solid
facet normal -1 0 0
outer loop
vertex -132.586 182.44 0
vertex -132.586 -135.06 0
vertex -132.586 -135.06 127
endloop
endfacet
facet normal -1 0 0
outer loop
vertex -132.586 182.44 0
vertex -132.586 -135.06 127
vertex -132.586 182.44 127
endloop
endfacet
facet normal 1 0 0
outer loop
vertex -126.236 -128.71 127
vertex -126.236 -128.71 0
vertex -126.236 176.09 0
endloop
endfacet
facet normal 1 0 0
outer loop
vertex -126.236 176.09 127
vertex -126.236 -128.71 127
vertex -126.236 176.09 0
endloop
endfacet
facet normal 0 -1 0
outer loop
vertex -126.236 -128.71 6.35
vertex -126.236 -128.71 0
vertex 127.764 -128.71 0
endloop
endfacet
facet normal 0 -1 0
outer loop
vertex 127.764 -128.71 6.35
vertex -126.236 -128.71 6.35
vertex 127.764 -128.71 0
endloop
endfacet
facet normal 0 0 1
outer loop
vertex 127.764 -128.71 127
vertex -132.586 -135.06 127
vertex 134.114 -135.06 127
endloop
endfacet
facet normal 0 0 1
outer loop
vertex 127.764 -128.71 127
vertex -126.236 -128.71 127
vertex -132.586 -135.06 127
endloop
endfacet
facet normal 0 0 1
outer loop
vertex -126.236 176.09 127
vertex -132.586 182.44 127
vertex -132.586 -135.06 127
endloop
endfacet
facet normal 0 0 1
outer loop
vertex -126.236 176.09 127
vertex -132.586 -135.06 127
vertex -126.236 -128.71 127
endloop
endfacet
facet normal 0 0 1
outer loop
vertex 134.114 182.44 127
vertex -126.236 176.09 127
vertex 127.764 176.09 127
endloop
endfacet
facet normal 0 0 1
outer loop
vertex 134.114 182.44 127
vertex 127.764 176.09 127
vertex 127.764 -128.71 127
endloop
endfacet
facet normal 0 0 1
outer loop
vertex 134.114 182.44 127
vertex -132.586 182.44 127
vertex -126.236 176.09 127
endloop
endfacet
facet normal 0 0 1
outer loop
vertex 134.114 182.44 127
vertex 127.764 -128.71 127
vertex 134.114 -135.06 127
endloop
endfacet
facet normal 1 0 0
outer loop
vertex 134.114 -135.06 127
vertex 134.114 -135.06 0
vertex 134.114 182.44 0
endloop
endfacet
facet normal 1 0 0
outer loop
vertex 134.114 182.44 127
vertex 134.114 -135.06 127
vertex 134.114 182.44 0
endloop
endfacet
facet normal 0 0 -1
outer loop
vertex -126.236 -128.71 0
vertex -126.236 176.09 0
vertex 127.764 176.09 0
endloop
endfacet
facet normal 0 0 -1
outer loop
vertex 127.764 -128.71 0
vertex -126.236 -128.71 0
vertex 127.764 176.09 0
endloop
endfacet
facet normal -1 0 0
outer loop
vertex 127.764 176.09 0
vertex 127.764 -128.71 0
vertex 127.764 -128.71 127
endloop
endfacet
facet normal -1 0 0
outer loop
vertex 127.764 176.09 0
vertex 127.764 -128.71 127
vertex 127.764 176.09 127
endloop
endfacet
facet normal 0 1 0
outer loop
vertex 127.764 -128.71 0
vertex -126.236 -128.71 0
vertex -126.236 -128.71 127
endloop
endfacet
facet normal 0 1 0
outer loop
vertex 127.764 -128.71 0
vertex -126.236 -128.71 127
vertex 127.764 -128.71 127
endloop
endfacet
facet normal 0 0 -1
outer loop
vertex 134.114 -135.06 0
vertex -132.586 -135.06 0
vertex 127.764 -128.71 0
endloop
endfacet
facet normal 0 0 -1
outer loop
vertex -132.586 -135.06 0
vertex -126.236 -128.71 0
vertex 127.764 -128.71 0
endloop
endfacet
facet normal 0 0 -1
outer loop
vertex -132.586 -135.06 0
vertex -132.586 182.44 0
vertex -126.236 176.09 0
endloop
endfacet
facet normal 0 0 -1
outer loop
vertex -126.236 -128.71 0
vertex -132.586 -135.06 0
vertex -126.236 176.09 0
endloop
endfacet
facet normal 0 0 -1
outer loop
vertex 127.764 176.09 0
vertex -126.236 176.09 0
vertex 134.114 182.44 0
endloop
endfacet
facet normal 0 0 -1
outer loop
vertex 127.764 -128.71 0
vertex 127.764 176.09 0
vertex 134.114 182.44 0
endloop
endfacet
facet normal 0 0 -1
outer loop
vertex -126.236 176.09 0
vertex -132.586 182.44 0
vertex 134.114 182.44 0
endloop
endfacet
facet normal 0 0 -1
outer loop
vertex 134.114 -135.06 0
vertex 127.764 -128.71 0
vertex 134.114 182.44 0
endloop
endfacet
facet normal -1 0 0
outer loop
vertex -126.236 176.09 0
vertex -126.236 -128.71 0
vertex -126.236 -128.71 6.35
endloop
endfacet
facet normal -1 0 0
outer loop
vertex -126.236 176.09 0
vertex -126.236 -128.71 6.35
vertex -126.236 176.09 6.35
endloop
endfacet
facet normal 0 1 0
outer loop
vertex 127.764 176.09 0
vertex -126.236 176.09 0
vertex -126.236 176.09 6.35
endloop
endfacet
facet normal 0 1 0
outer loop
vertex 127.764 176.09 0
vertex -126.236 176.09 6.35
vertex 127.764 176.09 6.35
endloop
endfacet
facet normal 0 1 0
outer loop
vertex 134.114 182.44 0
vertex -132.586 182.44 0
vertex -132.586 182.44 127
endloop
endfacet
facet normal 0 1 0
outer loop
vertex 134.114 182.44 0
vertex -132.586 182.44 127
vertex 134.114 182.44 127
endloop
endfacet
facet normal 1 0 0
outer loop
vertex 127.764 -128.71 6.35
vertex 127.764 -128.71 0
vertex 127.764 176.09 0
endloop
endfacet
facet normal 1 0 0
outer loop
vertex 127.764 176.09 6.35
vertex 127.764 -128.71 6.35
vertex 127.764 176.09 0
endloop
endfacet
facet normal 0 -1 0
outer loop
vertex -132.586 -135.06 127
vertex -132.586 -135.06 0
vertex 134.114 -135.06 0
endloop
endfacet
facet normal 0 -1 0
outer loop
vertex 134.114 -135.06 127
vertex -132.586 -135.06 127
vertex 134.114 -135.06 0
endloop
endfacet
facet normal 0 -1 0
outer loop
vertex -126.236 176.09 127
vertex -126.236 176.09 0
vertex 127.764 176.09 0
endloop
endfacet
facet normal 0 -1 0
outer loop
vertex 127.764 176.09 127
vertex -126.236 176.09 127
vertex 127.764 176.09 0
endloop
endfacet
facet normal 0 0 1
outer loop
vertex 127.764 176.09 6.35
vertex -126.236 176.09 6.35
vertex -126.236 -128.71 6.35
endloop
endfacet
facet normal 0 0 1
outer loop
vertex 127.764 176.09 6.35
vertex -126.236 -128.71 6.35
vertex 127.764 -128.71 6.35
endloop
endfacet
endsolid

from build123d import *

# Parameters (mm, degrees)
F0_W     = 254
F0_H     = 304.8
F1_DEPTH = 6.35
F0_W_2   = 266.7
F0_H_2   = 317.5
F2_DEPTH = 127


with BuildPart() as f1:
    # F0 (on Top) → F1 (new body)
    with BuildSketch(Plane.XY):
        with Locations((0.764279, 23.689574)):
            Rectangle(F0_W, F0_H)
    extrude(amount=F1_DEPTH)


with BuildPart() as f2:
    # F0 (on Top) → F2 (new body)
    with BuildSketch(Plane.XY):
        with Locations((0.764279, 23.689574)):
            Rectangle(F0_W_2, F0_H_2)
        with Locations((0.764279, 23.689574)):
            Rectangle(F0_W, F0_H, mode=Mode.SUBTRACT)
    extrude(amount=F2_DEPTH)


solid = Compound([f1.part, f2.part])
